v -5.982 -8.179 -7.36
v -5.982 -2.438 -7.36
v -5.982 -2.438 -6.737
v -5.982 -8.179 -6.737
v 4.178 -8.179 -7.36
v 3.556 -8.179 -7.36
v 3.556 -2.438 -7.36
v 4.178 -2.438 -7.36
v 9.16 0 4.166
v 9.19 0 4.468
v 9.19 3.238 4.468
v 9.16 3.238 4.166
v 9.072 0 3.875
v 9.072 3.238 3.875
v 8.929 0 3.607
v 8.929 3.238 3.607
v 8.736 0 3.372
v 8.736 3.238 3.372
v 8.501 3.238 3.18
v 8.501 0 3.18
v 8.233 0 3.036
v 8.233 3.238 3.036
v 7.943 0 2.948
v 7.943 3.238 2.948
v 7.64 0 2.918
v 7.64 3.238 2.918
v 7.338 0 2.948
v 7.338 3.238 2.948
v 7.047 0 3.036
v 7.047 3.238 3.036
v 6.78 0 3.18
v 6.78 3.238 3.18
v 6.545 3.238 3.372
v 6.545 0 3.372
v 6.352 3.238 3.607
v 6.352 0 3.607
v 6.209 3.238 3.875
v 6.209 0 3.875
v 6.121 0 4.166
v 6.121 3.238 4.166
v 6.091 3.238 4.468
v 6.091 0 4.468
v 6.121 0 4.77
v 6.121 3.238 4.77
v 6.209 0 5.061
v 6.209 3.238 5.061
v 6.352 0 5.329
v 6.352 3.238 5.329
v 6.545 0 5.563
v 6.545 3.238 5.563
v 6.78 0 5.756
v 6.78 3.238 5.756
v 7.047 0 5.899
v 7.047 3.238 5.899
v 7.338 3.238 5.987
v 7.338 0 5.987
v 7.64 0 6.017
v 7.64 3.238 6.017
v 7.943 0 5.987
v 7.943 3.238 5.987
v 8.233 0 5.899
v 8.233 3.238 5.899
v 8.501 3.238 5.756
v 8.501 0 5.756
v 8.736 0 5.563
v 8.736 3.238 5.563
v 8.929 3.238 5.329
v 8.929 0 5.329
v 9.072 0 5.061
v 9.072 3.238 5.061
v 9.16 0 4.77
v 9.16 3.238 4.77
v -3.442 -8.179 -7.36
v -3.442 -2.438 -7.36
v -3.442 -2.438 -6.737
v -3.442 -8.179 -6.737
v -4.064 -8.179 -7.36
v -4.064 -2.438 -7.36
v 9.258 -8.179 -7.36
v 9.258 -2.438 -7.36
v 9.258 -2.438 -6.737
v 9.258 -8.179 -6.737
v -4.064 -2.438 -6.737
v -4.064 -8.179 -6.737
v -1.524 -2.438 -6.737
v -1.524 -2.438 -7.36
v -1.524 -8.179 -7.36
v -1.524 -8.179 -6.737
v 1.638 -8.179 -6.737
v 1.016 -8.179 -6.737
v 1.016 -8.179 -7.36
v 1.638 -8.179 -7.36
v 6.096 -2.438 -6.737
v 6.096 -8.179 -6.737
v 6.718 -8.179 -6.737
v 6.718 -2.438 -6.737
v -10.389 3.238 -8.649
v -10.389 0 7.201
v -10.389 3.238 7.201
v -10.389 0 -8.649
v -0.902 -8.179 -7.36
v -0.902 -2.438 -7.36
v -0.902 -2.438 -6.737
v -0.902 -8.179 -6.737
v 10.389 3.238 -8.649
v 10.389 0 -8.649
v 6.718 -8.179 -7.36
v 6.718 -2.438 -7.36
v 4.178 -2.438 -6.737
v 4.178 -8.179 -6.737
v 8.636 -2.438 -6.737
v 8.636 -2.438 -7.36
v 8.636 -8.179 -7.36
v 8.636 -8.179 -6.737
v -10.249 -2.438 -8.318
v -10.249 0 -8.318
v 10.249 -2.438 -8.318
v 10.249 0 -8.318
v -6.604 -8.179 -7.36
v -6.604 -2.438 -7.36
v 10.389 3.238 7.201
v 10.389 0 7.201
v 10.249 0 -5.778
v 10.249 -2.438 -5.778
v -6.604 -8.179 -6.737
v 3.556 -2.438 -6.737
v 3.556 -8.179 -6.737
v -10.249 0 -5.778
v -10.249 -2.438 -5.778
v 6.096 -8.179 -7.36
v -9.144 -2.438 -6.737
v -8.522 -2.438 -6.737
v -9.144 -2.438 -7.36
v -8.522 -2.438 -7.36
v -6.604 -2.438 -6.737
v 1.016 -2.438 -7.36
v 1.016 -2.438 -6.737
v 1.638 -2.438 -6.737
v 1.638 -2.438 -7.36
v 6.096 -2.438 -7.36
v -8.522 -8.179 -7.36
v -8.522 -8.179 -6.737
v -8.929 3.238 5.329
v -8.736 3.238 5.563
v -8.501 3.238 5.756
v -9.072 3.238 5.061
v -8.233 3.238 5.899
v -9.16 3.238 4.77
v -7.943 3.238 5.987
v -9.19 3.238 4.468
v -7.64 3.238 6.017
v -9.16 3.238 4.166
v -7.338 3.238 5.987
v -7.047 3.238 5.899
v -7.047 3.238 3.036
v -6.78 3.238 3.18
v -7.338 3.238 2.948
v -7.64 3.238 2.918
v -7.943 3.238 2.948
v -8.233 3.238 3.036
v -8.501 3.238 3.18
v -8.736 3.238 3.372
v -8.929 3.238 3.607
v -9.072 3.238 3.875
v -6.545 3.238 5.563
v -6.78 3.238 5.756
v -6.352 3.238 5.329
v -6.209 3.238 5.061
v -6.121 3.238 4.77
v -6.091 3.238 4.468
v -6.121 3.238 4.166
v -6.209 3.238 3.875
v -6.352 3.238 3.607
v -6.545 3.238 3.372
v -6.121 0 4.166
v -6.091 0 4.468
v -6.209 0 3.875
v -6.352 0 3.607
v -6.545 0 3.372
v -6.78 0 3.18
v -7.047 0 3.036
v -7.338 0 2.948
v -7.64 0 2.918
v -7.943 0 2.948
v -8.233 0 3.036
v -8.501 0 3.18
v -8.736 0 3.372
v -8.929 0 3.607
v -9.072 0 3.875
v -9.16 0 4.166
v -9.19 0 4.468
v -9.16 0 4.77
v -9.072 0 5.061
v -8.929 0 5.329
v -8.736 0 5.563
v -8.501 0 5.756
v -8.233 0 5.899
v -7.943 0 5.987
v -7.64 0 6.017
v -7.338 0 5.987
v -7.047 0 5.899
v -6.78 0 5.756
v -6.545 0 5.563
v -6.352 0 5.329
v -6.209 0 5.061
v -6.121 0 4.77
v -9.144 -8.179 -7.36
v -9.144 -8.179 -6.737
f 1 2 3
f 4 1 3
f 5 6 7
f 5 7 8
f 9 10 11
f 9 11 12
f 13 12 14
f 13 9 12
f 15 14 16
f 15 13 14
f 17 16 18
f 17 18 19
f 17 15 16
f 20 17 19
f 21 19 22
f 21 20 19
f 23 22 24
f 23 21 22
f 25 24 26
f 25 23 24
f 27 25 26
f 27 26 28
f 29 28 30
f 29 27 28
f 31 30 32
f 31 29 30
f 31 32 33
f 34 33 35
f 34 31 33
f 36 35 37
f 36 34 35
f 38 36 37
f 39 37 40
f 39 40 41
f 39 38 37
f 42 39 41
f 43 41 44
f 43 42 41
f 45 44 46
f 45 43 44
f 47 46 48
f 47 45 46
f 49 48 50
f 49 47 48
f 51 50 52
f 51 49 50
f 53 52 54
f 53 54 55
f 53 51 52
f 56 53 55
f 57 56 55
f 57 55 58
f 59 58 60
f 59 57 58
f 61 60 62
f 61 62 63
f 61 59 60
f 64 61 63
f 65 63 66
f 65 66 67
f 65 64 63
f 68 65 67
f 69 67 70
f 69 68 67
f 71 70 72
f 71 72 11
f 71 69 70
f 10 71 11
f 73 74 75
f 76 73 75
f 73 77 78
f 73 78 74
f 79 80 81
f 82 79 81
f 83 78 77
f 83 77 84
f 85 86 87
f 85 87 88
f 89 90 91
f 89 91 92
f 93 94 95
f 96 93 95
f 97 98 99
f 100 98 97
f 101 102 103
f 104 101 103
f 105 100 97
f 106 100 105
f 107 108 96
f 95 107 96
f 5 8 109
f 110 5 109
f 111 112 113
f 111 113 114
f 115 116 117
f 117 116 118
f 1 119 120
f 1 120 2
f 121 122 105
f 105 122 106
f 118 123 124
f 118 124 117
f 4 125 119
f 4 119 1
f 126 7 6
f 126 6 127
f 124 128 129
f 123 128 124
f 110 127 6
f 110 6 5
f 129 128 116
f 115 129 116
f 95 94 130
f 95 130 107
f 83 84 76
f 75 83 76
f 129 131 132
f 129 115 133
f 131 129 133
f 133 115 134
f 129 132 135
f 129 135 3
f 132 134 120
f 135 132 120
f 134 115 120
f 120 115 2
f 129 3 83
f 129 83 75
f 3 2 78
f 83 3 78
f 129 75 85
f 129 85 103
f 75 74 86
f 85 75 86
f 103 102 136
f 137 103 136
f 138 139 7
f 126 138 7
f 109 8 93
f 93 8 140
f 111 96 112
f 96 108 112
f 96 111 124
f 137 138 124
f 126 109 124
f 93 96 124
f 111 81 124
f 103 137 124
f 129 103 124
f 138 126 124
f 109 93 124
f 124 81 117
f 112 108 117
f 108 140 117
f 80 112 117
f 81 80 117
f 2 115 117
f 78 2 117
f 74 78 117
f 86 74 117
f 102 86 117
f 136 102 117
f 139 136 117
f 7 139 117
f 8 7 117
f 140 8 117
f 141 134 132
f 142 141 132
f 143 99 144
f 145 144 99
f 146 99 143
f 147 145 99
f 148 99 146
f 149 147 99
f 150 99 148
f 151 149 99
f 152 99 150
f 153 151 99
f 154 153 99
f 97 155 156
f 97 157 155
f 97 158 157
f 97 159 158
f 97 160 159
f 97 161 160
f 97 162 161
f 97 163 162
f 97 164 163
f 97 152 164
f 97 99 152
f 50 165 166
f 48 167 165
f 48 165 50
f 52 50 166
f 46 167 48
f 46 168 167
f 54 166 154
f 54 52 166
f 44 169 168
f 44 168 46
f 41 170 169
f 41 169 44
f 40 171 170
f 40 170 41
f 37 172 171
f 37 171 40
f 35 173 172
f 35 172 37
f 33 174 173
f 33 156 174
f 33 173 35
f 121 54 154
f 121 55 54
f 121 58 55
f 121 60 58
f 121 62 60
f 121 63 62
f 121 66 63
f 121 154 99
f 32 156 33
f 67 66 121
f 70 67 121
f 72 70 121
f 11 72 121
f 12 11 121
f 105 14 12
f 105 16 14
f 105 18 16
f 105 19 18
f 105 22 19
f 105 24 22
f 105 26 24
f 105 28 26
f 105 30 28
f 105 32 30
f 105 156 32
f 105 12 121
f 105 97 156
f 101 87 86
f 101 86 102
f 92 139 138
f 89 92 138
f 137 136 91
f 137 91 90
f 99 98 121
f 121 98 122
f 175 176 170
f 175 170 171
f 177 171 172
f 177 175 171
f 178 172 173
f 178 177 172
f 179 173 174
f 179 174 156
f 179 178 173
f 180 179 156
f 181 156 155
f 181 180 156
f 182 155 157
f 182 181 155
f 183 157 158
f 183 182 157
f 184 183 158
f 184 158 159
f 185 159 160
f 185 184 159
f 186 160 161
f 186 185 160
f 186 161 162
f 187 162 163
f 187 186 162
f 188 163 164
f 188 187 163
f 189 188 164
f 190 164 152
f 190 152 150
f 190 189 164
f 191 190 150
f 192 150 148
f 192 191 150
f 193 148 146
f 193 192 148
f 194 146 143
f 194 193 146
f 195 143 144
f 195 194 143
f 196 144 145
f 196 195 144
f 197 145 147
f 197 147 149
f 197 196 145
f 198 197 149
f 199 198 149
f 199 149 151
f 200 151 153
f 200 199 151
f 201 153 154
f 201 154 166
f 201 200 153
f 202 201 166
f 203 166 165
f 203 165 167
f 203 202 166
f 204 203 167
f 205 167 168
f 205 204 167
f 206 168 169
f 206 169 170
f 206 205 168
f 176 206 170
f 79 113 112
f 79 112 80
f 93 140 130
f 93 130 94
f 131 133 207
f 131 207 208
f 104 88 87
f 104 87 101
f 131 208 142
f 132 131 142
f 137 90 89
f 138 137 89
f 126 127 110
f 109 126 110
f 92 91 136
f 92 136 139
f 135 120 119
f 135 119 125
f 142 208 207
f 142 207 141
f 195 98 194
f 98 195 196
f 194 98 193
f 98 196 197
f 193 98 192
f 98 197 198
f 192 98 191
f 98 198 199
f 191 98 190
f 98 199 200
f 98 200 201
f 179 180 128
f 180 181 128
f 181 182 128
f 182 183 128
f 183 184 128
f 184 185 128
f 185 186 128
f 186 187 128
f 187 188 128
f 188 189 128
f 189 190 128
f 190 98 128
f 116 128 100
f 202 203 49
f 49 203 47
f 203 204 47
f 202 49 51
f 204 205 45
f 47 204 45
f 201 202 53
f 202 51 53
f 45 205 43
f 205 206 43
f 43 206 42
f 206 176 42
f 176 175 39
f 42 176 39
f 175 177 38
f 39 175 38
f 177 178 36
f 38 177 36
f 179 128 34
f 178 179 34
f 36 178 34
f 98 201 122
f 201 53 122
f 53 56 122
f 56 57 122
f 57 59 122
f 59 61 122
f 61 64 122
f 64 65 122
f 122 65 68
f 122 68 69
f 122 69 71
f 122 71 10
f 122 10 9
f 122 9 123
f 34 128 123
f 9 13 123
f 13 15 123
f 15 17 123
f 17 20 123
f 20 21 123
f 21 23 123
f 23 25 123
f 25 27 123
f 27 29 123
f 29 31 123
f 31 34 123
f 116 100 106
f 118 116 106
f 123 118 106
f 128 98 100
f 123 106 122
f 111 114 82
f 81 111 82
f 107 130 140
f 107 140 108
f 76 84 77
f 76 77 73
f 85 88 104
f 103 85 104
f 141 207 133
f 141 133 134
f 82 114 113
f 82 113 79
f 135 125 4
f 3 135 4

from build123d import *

# Parameters (mm, degrees)
SKETCH1_W           = 20.7772
SKETCH1_H           = 15.8496
SKETCH1_R           = 1.5494
BOSS_EXTRUDE2_DEPTH = 3.2385
SKETCH2_W           = 20.4978
SKETCH2_H           = 2.54
BOSS_EXTRUDE3_DEPTH = 2.4384
SKETCH3_W           = 0.6223
SKETCH3_H           = 0.6223
BOSS_EXTRUDE4_DEPTH = 5.7404


with BuildPart() as part:
    # Sketch1 → Boss-Extrude2 (new body)
    with BuildSketch(Plane(origin=(0, 0, 0), x_dir=(1, 0, 0), z_dir=(0, 1, 0))):
        with Locations((0, 0.7239)):
            Rectangle(SKETCH1_W, SKETCH1_H)
        with Locations((7.64032, -4.46786)):
            Circle(SKETCH1_R, mode=Mode.SUBTRACT)
        with Locations((-7.64032, -4.46786)):
            Circle(SKETCH1_R, mode=Mode.SUBTRACT)
    extrude(amount=BOSS_EXTRUDE2_DEPTH)

    # Sketch2 → Boss-Extrude3 (add)
    with BuildSketch(Plane(origin=(0, 0, 0), x_dir=(1, 0, 0), z_dir=(0, 1, 0))):
        with Locations((0, 7.0485)):
            Rectangle(SKETCH2_W, SKETCH2_H)
    extrude(amount=-BOSS_EXTRUDE3_DEPTH)

    # Sketch3 → Boss-Extrude4 (add)
    with BuildSketch(Plane.XZ.offset(2.4384)):
        with Locations((-6.29285, -7.0485)):
            Rectangle(SKETCH3_W, SKETCH3_H)
        with Locations((-8.83285, -7.0485)):
            Rectangle(SKETCH3_W, SKETCH3_H)
        with Locations((-3.75285, -7.0485)):
            Rectangle(SKETCH3_W, SKETCH3_H)
        with Locations((-1.21285, -7.0485)):
            Rectangle(SKETCH3_W, SKETCH3_H)
        with Locations((1.32715, -7.0485)):
            Rectangle(SKETCH3_W, SKETCH3_H)
        with Locations((3.86715, -7.0485)):
            Rectangle(SKETCH3_W, SKETCH3_H)
        with Locations((6.40715, -7.0485)):
            Rectangle(SKETCH3_W, SKETCH3_H)
        with Locations((8.94715, -7.0485)):
            Rectangle(SKETCH3_W, SKETCH3_H)
    extrude(amount=BOSS_EXTRUDE4_DEPTH)


solid = part.part
